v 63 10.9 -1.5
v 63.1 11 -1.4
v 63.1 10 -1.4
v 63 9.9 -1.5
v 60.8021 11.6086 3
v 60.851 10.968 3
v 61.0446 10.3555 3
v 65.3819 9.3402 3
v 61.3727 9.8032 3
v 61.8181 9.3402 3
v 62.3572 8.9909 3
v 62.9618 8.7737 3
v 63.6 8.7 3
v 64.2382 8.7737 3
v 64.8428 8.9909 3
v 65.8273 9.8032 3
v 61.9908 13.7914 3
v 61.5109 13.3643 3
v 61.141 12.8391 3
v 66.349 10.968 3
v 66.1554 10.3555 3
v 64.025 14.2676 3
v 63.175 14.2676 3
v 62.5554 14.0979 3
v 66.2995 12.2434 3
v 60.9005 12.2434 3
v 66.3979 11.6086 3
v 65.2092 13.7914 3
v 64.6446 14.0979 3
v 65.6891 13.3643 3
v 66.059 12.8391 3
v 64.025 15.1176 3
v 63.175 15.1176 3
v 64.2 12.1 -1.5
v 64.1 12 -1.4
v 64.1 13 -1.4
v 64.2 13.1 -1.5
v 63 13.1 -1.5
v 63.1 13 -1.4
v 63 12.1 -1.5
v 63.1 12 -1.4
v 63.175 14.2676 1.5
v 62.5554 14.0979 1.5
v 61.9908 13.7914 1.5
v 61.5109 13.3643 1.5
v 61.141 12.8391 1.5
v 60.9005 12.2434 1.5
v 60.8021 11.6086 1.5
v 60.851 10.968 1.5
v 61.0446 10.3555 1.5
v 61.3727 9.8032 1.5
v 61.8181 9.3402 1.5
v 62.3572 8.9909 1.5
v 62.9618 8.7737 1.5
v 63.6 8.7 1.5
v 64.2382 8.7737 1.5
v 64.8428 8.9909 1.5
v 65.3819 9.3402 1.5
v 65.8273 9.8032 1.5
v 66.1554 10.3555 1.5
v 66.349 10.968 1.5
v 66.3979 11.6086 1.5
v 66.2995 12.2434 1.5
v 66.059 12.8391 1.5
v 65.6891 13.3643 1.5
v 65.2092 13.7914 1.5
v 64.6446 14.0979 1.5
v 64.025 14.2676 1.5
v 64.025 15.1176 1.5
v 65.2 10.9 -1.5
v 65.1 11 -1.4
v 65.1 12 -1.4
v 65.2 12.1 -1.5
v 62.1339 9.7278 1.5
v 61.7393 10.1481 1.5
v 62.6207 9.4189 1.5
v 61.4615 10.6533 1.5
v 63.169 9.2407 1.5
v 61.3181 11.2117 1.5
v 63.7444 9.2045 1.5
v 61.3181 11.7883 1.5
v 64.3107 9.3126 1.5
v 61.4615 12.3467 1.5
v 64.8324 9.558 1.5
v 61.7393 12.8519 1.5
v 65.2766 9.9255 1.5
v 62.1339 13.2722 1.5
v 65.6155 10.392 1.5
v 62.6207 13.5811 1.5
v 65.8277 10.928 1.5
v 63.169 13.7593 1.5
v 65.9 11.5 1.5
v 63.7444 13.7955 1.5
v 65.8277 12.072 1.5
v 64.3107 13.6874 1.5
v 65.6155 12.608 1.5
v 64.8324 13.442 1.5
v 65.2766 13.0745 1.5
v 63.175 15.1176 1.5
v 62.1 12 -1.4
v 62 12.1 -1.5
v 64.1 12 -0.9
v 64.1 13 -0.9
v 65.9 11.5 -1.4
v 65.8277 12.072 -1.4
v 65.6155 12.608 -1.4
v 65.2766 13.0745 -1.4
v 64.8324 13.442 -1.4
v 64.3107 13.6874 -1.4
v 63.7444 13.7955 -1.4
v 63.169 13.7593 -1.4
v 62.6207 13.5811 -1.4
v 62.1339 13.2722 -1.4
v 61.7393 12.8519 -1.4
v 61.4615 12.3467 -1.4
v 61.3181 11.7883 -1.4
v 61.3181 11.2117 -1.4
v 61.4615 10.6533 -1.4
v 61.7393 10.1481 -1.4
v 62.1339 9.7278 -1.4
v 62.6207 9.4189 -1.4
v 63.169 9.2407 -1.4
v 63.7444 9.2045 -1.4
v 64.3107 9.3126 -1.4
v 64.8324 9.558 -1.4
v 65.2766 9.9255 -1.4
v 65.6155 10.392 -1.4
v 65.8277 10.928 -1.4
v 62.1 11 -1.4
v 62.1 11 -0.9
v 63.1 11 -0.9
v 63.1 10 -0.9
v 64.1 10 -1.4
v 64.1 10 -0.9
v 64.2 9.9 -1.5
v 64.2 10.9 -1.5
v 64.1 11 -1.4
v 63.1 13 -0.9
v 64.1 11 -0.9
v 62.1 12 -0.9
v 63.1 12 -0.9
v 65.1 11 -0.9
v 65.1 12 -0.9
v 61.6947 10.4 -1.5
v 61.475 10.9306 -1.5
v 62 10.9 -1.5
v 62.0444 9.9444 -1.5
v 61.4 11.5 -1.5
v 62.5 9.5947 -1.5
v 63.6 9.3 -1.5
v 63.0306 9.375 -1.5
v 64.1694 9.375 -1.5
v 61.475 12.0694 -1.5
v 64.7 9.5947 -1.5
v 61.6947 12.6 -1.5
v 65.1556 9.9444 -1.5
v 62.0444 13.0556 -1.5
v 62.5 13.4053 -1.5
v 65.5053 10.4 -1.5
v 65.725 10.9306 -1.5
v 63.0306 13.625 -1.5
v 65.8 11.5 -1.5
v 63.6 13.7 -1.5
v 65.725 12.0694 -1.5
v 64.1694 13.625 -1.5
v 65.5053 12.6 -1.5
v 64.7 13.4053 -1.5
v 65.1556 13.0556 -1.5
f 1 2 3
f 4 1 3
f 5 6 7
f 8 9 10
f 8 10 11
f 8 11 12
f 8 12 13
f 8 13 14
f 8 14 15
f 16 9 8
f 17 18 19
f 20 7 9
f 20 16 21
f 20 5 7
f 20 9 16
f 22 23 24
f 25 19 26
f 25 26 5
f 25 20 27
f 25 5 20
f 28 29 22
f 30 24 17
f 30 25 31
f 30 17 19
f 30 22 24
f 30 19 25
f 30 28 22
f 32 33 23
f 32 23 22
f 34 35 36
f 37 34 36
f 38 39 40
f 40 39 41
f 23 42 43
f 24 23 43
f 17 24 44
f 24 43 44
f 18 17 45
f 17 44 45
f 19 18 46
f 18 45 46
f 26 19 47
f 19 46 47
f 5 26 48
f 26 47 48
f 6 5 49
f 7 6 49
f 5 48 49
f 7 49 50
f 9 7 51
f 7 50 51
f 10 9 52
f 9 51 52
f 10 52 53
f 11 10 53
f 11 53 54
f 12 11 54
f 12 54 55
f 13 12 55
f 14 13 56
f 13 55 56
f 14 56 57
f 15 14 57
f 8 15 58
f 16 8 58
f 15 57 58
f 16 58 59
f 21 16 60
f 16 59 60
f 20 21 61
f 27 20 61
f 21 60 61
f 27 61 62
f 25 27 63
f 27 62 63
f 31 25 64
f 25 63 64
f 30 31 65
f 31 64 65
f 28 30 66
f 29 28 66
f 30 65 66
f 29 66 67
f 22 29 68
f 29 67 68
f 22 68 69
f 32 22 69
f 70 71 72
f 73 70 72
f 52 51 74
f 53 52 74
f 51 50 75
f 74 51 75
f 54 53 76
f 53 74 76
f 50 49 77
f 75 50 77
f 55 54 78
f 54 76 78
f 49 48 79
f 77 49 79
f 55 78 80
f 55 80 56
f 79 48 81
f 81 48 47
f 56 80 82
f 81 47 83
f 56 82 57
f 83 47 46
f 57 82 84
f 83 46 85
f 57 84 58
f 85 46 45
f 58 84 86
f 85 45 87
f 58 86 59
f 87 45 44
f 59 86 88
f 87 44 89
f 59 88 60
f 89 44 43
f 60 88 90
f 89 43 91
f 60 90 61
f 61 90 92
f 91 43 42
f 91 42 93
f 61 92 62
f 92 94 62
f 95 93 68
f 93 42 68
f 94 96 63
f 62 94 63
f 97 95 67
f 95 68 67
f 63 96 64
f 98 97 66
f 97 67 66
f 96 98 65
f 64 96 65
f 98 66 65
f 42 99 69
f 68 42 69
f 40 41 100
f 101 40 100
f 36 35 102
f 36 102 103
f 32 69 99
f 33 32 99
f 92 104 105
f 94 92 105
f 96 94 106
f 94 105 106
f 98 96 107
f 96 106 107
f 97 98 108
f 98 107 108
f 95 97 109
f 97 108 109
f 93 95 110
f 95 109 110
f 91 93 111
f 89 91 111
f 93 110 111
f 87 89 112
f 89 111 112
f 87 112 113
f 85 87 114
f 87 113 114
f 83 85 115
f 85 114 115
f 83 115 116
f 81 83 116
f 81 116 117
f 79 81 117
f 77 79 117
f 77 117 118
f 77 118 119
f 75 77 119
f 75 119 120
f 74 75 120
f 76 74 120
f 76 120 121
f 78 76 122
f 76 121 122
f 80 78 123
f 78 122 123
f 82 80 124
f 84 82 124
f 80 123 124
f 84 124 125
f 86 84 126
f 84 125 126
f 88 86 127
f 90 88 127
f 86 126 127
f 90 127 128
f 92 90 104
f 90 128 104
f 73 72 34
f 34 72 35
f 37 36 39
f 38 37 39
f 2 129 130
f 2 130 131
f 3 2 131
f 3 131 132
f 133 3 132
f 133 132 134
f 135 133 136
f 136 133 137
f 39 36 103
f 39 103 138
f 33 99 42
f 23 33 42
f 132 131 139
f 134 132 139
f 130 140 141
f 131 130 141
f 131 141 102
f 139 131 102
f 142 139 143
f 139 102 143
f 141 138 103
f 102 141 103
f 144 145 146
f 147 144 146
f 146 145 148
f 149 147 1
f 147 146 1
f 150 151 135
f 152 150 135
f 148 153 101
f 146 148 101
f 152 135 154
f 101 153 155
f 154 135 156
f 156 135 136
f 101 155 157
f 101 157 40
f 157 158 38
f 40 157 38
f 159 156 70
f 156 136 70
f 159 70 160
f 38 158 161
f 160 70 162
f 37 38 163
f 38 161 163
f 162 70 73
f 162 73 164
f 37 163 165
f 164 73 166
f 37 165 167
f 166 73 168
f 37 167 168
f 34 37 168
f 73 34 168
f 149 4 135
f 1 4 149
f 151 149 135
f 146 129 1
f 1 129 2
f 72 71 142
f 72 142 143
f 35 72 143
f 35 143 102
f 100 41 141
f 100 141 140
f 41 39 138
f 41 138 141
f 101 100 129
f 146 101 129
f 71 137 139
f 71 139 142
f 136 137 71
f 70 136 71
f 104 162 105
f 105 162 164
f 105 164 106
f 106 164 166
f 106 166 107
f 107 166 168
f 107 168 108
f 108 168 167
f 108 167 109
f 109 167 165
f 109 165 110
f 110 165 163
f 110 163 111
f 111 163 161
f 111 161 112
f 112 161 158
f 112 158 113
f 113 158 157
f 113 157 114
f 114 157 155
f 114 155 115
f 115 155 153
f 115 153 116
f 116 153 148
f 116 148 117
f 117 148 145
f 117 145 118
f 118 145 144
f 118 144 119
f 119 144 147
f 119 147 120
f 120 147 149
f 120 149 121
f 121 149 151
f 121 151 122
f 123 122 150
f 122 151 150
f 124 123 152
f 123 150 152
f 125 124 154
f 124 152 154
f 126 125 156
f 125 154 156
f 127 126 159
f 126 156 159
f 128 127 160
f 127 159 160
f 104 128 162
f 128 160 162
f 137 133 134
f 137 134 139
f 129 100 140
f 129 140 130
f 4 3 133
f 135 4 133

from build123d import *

# Parameters (mm, degrees)
SKETCH061_R     = 2.3
PAD042_DEPTH    = 3
PAD043_DEPTH    = 1.5
POCKET012_DEPTH = 0.6
CHAMFER006_SIZE = 0.1


with BuildPart() as part:
    # Sketch061 → Pad042 (new body)
    with BuildSketch(Plane.XY):
        Circle(SKETCH061_R)
    extrude(amount=PAD042_DEPTH)

    # Sketch062 (on Face3 of Pad042) → Pad043 (join)
    with BuildSketch(Plane.XY.offset(3)):
        with BuildLine():
            Line((0.425, 2.767558), (0.425, 3.617558))
            Line((0.425, 3.617558), (-0.425, 3.617558))
            Line((-0.425, 3.617558), (-0.425, 2.767558))
            ThreePointArc((-0.425, 2.767558), (0, -2.8), (0.425, 2.767558))
        make_face()
    extrude(amount=PAD043_DEPTH)

    # Sketch063 → Pocket012 (cut)
    with BuildSketch(Plane.XY):
        Polygon((-0.5, 0.5), (-1.5, 0.5), (-1.5, -0.5), (-0.5, -0.5), (-0.5, -1.5), (0.5, -1.5), (0.5, -0.5), (1.5, -0.5), (1.5, 0.5), (0.5, 0.5), (0.5, 1.5), (-0.5, 1.5), align=None)
    extrude(amount=POCKET012_DEPTH, mode=Mode.SUBTRACT)

    # Chamfer006
    chamfer006_edges = [part.edges().sort_by_distance(p)[0] for p in [
        (-1, 0.5, 0),
        (-2.3, 0, 0),
        (-1.5, 0, 0),
        (-1, -0.5, 0),
        (-0.5, -1, 0),
        (0, -1.5, 0),
        (0.5, -1, 0),
        (1, -0.5, 0),
        (1.5, 0, 0),
        (1, 0.5, 0),
        (0.5, 1, 0),
        (0, 1.5, 0),
        (-0.5, 1, 0),
    ]]
    chamfer(chamfer006_edges, length=CHAMFER006_SIZE)


with BuildPart() as part_1:
    # Body018 placement: moved
    add(part.part.moved(Location((63.6, 11.5, -1.5))))


solid = part_1.part
